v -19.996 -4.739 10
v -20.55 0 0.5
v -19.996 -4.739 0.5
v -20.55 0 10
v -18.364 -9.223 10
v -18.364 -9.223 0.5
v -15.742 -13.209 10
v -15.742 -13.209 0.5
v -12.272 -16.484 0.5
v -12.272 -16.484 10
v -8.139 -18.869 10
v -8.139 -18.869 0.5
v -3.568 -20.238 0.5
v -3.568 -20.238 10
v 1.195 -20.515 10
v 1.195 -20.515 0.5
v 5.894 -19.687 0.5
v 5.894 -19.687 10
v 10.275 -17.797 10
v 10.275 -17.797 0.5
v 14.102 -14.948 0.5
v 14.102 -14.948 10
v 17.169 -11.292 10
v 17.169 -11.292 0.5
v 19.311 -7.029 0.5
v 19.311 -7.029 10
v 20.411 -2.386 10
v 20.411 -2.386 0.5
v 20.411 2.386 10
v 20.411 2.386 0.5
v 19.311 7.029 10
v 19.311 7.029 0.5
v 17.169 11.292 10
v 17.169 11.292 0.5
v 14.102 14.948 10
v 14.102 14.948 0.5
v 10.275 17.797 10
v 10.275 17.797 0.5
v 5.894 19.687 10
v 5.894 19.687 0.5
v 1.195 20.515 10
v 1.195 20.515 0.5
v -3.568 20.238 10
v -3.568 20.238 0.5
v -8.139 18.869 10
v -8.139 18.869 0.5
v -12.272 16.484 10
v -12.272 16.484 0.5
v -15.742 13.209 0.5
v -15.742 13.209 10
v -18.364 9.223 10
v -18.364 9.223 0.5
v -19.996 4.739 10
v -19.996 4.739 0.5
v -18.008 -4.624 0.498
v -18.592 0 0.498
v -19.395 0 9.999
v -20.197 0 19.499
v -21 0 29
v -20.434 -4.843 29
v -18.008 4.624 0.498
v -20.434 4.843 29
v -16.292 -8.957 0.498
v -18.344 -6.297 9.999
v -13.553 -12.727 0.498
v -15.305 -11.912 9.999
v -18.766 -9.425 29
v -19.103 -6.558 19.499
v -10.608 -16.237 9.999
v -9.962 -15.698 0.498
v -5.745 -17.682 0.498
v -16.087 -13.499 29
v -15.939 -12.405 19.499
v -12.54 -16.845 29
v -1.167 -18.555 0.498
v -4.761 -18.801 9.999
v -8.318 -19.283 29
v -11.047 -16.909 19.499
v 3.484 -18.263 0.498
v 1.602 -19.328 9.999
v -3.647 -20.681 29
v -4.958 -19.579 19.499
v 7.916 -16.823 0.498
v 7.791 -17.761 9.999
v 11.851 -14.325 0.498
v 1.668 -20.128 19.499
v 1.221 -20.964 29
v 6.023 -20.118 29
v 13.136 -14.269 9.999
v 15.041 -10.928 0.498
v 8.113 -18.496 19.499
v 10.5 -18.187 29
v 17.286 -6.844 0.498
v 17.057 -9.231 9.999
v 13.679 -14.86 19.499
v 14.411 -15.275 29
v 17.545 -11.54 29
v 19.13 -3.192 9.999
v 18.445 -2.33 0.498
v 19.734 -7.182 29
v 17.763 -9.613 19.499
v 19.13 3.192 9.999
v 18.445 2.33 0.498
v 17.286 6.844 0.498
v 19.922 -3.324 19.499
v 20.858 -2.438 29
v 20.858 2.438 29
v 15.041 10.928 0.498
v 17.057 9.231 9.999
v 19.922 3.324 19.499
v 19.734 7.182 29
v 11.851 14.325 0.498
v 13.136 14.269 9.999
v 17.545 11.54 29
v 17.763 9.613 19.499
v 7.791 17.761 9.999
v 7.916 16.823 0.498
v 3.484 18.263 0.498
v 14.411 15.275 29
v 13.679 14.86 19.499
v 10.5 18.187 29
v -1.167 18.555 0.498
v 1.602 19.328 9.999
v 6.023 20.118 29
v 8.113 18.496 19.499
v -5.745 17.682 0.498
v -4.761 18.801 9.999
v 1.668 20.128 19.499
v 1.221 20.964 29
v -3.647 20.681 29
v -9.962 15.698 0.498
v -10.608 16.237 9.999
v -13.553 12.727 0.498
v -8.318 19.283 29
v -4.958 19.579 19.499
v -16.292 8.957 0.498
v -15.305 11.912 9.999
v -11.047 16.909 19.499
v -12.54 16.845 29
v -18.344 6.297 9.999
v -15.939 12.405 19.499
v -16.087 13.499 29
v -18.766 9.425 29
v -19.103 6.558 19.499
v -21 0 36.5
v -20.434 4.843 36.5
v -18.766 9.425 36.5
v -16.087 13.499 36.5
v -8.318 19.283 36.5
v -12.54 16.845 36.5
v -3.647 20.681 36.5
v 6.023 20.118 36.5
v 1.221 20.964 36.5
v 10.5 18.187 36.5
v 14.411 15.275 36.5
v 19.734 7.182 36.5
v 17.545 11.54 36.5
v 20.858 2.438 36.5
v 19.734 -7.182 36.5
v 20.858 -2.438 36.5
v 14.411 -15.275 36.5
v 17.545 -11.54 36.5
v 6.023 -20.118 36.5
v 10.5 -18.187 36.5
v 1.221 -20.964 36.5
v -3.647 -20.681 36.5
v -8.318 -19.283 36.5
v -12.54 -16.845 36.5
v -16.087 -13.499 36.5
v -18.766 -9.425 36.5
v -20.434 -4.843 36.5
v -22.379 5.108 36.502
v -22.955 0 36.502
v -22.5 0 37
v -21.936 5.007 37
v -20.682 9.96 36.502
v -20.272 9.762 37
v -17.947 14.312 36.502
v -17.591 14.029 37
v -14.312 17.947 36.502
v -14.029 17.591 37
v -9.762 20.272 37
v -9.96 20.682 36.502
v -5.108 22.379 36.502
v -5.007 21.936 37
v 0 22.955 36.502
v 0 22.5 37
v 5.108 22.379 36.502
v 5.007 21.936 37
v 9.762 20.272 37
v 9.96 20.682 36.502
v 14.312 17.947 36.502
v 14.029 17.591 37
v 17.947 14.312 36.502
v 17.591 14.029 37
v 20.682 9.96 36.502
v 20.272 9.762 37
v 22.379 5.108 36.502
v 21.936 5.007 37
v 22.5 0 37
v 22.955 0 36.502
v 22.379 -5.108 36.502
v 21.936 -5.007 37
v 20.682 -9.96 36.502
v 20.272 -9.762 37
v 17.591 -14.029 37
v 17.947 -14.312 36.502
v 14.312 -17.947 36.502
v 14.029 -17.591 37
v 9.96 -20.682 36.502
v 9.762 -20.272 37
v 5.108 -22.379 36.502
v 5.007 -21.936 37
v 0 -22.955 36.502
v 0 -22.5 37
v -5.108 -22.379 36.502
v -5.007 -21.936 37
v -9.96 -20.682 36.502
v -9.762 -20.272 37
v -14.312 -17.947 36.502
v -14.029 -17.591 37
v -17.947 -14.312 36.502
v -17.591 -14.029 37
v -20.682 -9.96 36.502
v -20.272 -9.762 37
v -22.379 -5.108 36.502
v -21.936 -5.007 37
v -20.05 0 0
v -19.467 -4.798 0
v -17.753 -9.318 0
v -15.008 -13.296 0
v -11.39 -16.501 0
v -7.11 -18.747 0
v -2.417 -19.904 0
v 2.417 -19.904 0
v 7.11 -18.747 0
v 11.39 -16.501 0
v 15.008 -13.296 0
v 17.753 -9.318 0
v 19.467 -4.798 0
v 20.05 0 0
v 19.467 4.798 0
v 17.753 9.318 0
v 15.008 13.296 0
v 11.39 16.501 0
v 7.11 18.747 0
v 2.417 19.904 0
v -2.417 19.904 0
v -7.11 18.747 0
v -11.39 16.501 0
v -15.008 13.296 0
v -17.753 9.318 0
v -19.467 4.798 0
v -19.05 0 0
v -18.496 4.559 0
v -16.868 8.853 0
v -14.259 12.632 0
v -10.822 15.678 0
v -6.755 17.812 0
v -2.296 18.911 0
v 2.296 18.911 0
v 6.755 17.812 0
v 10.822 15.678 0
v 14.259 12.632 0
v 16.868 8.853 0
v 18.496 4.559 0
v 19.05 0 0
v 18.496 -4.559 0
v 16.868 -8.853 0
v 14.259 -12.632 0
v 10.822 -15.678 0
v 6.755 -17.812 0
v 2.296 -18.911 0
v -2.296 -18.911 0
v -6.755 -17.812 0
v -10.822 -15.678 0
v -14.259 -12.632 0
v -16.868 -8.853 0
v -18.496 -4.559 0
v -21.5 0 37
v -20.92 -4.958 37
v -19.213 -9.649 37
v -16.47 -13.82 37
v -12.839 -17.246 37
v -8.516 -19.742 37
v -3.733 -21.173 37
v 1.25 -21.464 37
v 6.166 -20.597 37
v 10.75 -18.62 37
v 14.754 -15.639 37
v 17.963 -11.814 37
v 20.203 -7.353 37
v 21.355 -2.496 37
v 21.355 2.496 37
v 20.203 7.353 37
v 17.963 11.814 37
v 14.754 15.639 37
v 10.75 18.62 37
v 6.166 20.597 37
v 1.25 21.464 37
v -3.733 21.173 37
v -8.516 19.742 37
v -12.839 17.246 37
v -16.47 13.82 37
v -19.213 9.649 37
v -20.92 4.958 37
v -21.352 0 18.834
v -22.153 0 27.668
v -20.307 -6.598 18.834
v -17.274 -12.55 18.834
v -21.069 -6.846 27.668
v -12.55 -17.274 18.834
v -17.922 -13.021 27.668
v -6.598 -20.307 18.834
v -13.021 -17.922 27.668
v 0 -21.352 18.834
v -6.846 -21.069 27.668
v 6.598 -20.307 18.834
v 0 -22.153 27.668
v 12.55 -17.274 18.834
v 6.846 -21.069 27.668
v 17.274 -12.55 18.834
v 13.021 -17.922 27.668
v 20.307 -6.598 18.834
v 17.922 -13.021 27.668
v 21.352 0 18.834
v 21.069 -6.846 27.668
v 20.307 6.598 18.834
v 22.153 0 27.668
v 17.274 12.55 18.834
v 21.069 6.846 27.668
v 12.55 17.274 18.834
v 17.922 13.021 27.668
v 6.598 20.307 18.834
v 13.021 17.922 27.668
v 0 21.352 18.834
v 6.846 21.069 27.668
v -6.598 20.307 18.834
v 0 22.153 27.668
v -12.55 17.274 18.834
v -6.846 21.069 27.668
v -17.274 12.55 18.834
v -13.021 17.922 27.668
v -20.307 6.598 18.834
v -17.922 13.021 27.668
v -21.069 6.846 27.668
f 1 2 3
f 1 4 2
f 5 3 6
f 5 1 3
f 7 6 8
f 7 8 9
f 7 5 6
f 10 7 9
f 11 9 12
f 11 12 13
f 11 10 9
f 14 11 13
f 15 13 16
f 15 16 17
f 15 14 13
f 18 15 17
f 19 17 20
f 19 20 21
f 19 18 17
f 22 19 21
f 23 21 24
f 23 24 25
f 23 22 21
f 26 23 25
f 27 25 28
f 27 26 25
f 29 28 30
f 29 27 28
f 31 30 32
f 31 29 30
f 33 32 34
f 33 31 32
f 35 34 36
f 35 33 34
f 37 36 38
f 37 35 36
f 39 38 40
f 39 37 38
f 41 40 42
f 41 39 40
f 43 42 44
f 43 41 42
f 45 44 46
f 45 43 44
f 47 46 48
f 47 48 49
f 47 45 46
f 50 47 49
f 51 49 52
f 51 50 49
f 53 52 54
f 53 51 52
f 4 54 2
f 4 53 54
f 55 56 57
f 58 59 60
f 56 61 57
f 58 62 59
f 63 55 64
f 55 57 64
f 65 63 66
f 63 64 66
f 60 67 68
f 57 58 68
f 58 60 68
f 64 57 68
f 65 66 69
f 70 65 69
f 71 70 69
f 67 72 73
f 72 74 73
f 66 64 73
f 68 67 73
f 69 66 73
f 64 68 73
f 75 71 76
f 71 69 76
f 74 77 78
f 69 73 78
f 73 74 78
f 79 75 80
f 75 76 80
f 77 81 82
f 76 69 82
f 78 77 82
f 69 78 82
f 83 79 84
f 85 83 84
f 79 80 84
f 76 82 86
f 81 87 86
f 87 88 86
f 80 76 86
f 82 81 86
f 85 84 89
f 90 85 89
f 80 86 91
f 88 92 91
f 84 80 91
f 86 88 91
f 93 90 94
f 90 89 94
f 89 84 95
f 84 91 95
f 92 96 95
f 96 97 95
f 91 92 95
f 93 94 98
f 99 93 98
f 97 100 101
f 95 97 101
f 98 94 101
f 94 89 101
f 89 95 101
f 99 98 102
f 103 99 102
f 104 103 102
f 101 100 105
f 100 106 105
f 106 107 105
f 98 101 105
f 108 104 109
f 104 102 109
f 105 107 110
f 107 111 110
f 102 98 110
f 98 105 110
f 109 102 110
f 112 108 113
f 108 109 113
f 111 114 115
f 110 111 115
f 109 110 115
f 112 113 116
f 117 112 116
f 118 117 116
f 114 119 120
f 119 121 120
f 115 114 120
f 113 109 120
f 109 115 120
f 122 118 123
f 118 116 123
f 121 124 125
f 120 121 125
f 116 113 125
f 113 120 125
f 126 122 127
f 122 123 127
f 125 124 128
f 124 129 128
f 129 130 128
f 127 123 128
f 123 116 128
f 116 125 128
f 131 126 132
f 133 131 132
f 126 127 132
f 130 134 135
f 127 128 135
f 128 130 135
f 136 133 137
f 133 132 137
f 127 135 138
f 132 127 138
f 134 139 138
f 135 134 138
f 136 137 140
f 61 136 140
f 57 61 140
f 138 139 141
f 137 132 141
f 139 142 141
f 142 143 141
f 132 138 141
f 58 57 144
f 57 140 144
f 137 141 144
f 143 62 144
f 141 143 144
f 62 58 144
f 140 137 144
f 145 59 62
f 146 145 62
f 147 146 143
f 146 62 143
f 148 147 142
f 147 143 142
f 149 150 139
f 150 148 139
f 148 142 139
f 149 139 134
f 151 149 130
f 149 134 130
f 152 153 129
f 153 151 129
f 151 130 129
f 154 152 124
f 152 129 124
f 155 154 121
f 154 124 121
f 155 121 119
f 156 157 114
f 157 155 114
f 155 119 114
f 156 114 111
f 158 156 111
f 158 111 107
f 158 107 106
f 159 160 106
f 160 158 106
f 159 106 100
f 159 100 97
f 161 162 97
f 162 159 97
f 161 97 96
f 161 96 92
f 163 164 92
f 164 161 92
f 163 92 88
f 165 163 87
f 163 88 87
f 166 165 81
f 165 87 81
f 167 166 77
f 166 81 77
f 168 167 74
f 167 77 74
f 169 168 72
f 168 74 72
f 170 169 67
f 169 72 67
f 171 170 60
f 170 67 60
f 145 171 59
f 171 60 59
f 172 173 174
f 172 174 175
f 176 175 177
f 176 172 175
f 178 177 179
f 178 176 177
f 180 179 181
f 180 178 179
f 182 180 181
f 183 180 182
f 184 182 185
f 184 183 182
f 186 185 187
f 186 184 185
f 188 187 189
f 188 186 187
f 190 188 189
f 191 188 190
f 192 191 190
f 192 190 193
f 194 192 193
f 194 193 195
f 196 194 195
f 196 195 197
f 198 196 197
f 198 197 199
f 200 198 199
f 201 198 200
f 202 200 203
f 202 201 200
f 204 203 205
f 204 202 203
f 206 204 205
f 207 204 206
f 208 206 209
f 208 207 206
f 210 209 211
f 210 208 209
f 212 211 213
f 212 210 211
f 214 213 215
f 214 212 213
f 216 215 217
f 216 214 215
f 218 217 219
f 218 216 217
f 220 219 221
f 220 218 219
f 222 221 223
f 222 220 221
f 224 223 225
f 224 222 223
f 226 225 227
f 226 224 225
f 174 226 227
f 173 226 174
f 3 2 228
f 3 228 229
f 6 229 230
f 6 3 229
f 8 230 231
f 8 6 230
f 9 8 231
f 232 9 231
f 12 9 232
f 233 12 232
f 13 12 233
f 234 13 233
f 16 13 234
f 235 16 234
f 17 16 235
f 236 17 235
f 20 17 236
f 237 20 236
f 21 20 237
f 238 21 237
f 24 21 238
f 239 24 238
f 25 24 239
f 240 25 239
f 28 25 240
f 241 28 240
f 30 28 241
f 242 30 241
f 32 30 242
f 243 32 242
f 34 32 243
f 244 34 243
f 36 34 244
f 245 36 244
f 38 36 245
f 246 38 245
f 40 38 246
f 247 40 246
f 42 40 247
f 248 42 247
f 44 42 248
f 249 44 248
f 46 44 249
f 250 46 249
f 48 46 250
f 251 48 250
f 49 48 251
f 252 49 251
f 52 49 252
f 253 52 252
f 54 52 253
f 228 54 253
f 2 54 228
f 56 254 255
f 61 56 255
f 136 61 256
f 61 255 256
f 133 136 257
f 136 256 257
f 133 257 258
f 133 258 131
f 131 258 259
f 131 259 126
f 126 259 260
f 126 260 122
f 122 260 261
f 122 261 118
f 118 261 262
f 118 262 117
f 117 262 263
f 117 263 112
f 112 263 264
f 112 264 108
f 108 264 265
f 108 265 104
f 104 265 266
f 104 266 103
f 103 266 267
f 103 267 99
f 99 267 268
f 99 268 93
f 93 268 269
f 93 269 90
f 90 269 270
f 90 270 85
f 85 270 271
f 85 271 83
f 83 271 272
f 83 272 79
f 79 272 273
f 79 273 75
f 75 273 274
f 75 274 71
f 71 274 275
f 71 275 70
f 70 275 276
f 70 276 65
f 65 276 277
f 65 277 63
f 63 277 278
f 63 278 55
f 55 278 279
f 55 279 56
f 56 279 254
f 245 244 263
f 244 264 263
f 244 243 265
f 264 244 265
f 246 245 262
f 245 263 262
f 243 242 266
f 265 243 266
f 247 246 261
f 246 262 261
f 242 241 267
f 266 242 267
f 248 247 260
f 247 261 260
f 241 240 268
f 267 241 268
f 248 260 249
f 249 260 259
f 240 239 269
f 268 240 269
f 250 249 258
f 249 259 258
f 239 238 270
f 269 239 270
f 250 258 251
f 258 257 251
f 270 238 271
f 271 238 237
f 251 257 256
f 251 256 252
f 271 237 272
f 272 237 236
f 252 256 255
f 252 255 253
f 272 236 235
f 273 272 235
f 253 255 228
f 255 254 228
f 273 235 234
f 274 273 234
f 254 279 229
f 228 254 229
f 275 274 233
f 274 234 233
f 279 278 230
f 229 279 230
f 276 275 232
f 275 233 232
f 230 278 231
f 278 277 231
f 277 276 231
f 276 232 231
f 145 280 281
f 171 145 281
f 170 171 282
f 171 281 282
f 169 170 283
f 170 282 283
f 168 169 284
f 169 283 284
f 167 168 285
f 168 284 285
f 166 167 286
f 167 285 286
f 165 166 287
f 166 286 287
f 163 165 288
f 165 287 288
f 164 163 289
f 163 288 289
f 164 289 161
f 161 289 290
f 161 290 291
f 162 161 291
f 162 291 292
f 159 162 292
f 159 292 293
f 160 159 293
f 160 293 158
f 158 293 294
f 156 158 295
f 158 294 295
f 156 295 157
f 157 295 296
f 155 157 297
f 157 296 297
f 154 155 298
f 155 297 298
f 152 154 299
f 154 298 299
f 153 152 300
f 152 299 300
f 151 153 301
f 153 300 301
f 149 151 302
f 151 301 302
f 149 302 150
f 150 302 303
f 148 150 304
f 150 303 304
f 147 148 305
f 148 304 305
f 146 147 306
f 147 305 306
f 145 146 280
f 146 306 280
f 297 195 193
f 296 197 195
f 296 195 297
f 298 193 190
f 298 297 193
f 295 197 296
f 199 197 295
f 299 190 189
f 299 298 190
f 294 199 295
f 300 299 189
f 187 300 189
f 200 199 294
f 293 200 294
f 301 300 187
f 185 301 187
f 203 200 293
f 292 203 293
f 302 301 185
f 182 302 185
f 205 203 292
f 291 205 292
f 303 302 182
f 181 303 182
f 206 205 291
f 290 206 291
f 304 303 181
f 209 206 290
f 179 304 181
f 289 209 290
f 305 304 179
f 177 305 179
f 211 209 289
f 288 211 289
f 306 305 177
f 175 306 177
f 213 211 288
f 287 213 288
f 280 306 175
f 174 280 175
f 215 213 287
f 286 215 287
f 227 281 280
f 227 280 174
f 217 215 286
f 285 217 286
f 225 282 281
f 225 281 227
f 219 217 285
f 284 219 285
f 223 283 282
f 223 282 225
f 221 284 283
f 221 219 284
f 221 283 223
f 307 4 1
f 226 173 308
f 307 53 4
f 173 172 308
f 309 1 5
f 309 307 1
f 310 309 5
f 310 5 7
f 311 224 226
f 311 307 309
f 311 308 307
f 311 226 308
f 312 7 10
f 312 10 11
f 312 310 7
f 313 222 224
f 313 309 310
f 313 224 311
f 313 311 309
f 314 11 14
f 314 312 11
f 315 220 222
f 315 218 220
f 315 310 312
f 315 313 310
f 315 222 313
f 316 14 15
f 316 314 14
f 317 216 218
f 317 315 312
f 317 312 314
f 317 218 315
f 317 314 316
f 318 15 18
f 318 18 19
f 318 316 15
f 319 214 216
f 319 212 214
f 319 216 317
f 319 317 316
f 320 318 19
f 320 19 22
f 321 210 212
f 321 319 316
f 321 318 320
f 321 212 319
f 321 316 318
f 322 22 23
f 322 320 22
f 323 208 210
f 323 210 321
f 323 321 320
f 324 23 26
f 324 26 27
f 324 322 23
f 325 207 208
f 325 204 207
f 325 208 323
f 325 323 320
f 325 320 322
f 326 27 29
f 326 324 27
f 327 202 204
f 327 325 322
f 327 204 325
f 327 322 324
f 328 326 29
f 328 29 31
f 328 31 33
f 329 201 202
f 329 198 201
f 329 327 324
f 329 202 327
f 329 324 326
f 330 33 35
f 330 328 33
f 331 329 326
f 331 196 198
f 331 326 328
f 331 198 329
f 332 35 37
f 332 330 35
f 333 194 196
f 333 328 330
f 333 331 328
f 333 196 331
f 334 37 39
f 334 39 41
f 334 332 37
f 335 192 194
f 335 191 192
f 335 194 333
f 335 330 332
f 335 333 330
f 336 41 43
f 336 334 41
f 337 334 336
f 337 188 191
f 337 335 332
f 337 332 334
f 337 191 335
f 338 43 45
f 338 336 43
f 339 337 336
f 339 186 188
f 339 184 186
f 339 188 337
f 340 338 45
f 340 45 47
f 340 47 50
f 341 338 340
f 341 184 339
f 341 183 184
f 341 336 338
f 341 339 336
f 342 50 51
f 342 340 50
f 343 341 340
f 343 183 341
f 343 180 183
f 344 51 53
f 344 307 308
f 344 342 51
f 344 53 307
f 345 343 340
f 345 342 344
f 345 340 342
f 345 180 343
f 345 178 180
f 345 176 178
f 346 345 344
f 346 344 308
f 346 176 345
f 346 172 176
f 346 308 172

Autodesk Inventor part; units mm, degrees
ref_plane "YZ Plane" through (0, 0, 0) normal (1, 0, 0) x (0, 1, 0)
ref_plane "XZ Plane" through (0, 0, 0) normal (0, 1, 0) x (-1, 0, 0)
ref_plane "XY Plane" through (0, 0, 0) normal (0, 0, 1) x (1, 0, 0)
sketch "Sketch1" plane through (0, 0, 0) normal (0, 1, 0) x (-1, 0, 0)
  line L0 (0, 0) -> (0, 37)
  line L1 (20.55, 0) -> (20.55, 10)
  line L2 (20.55, 10) -> (23, 37)
  line L3 (23, 37) -> (21, 37)
  line L4 (18.55, 0) -> (20.55, 0)
  line L5 (0, 0) -> (18.55, 0) construction
  line L6 (21, 37) -> (0, 37) construction
  line L7 (21, 37) -> (21, 29)
  line L8 (21, 29) -> (18.55, 0)
  dimension "d0" = 41.1
  dimension "d1" = 42
  dimension "d2" = 37
  dimension "d3" = 10
  dimension "d4" = 8
  dimension "d11" = 2
  dimension "d12" = 2
revolve "Revolution1" add sketch "Sketch1" angle 360 about axis through (0, 0, 0) along (0, 0, 1)
chamfer "Chamfer1" distance 0.5 angle 45 4 edges at (20.55, 0, 0) (18.55, 0, 0) (23, 0, 37) (21, 0, 37)
properties part number "Takumar-to-RisingCam" material "ABS Plastic"
